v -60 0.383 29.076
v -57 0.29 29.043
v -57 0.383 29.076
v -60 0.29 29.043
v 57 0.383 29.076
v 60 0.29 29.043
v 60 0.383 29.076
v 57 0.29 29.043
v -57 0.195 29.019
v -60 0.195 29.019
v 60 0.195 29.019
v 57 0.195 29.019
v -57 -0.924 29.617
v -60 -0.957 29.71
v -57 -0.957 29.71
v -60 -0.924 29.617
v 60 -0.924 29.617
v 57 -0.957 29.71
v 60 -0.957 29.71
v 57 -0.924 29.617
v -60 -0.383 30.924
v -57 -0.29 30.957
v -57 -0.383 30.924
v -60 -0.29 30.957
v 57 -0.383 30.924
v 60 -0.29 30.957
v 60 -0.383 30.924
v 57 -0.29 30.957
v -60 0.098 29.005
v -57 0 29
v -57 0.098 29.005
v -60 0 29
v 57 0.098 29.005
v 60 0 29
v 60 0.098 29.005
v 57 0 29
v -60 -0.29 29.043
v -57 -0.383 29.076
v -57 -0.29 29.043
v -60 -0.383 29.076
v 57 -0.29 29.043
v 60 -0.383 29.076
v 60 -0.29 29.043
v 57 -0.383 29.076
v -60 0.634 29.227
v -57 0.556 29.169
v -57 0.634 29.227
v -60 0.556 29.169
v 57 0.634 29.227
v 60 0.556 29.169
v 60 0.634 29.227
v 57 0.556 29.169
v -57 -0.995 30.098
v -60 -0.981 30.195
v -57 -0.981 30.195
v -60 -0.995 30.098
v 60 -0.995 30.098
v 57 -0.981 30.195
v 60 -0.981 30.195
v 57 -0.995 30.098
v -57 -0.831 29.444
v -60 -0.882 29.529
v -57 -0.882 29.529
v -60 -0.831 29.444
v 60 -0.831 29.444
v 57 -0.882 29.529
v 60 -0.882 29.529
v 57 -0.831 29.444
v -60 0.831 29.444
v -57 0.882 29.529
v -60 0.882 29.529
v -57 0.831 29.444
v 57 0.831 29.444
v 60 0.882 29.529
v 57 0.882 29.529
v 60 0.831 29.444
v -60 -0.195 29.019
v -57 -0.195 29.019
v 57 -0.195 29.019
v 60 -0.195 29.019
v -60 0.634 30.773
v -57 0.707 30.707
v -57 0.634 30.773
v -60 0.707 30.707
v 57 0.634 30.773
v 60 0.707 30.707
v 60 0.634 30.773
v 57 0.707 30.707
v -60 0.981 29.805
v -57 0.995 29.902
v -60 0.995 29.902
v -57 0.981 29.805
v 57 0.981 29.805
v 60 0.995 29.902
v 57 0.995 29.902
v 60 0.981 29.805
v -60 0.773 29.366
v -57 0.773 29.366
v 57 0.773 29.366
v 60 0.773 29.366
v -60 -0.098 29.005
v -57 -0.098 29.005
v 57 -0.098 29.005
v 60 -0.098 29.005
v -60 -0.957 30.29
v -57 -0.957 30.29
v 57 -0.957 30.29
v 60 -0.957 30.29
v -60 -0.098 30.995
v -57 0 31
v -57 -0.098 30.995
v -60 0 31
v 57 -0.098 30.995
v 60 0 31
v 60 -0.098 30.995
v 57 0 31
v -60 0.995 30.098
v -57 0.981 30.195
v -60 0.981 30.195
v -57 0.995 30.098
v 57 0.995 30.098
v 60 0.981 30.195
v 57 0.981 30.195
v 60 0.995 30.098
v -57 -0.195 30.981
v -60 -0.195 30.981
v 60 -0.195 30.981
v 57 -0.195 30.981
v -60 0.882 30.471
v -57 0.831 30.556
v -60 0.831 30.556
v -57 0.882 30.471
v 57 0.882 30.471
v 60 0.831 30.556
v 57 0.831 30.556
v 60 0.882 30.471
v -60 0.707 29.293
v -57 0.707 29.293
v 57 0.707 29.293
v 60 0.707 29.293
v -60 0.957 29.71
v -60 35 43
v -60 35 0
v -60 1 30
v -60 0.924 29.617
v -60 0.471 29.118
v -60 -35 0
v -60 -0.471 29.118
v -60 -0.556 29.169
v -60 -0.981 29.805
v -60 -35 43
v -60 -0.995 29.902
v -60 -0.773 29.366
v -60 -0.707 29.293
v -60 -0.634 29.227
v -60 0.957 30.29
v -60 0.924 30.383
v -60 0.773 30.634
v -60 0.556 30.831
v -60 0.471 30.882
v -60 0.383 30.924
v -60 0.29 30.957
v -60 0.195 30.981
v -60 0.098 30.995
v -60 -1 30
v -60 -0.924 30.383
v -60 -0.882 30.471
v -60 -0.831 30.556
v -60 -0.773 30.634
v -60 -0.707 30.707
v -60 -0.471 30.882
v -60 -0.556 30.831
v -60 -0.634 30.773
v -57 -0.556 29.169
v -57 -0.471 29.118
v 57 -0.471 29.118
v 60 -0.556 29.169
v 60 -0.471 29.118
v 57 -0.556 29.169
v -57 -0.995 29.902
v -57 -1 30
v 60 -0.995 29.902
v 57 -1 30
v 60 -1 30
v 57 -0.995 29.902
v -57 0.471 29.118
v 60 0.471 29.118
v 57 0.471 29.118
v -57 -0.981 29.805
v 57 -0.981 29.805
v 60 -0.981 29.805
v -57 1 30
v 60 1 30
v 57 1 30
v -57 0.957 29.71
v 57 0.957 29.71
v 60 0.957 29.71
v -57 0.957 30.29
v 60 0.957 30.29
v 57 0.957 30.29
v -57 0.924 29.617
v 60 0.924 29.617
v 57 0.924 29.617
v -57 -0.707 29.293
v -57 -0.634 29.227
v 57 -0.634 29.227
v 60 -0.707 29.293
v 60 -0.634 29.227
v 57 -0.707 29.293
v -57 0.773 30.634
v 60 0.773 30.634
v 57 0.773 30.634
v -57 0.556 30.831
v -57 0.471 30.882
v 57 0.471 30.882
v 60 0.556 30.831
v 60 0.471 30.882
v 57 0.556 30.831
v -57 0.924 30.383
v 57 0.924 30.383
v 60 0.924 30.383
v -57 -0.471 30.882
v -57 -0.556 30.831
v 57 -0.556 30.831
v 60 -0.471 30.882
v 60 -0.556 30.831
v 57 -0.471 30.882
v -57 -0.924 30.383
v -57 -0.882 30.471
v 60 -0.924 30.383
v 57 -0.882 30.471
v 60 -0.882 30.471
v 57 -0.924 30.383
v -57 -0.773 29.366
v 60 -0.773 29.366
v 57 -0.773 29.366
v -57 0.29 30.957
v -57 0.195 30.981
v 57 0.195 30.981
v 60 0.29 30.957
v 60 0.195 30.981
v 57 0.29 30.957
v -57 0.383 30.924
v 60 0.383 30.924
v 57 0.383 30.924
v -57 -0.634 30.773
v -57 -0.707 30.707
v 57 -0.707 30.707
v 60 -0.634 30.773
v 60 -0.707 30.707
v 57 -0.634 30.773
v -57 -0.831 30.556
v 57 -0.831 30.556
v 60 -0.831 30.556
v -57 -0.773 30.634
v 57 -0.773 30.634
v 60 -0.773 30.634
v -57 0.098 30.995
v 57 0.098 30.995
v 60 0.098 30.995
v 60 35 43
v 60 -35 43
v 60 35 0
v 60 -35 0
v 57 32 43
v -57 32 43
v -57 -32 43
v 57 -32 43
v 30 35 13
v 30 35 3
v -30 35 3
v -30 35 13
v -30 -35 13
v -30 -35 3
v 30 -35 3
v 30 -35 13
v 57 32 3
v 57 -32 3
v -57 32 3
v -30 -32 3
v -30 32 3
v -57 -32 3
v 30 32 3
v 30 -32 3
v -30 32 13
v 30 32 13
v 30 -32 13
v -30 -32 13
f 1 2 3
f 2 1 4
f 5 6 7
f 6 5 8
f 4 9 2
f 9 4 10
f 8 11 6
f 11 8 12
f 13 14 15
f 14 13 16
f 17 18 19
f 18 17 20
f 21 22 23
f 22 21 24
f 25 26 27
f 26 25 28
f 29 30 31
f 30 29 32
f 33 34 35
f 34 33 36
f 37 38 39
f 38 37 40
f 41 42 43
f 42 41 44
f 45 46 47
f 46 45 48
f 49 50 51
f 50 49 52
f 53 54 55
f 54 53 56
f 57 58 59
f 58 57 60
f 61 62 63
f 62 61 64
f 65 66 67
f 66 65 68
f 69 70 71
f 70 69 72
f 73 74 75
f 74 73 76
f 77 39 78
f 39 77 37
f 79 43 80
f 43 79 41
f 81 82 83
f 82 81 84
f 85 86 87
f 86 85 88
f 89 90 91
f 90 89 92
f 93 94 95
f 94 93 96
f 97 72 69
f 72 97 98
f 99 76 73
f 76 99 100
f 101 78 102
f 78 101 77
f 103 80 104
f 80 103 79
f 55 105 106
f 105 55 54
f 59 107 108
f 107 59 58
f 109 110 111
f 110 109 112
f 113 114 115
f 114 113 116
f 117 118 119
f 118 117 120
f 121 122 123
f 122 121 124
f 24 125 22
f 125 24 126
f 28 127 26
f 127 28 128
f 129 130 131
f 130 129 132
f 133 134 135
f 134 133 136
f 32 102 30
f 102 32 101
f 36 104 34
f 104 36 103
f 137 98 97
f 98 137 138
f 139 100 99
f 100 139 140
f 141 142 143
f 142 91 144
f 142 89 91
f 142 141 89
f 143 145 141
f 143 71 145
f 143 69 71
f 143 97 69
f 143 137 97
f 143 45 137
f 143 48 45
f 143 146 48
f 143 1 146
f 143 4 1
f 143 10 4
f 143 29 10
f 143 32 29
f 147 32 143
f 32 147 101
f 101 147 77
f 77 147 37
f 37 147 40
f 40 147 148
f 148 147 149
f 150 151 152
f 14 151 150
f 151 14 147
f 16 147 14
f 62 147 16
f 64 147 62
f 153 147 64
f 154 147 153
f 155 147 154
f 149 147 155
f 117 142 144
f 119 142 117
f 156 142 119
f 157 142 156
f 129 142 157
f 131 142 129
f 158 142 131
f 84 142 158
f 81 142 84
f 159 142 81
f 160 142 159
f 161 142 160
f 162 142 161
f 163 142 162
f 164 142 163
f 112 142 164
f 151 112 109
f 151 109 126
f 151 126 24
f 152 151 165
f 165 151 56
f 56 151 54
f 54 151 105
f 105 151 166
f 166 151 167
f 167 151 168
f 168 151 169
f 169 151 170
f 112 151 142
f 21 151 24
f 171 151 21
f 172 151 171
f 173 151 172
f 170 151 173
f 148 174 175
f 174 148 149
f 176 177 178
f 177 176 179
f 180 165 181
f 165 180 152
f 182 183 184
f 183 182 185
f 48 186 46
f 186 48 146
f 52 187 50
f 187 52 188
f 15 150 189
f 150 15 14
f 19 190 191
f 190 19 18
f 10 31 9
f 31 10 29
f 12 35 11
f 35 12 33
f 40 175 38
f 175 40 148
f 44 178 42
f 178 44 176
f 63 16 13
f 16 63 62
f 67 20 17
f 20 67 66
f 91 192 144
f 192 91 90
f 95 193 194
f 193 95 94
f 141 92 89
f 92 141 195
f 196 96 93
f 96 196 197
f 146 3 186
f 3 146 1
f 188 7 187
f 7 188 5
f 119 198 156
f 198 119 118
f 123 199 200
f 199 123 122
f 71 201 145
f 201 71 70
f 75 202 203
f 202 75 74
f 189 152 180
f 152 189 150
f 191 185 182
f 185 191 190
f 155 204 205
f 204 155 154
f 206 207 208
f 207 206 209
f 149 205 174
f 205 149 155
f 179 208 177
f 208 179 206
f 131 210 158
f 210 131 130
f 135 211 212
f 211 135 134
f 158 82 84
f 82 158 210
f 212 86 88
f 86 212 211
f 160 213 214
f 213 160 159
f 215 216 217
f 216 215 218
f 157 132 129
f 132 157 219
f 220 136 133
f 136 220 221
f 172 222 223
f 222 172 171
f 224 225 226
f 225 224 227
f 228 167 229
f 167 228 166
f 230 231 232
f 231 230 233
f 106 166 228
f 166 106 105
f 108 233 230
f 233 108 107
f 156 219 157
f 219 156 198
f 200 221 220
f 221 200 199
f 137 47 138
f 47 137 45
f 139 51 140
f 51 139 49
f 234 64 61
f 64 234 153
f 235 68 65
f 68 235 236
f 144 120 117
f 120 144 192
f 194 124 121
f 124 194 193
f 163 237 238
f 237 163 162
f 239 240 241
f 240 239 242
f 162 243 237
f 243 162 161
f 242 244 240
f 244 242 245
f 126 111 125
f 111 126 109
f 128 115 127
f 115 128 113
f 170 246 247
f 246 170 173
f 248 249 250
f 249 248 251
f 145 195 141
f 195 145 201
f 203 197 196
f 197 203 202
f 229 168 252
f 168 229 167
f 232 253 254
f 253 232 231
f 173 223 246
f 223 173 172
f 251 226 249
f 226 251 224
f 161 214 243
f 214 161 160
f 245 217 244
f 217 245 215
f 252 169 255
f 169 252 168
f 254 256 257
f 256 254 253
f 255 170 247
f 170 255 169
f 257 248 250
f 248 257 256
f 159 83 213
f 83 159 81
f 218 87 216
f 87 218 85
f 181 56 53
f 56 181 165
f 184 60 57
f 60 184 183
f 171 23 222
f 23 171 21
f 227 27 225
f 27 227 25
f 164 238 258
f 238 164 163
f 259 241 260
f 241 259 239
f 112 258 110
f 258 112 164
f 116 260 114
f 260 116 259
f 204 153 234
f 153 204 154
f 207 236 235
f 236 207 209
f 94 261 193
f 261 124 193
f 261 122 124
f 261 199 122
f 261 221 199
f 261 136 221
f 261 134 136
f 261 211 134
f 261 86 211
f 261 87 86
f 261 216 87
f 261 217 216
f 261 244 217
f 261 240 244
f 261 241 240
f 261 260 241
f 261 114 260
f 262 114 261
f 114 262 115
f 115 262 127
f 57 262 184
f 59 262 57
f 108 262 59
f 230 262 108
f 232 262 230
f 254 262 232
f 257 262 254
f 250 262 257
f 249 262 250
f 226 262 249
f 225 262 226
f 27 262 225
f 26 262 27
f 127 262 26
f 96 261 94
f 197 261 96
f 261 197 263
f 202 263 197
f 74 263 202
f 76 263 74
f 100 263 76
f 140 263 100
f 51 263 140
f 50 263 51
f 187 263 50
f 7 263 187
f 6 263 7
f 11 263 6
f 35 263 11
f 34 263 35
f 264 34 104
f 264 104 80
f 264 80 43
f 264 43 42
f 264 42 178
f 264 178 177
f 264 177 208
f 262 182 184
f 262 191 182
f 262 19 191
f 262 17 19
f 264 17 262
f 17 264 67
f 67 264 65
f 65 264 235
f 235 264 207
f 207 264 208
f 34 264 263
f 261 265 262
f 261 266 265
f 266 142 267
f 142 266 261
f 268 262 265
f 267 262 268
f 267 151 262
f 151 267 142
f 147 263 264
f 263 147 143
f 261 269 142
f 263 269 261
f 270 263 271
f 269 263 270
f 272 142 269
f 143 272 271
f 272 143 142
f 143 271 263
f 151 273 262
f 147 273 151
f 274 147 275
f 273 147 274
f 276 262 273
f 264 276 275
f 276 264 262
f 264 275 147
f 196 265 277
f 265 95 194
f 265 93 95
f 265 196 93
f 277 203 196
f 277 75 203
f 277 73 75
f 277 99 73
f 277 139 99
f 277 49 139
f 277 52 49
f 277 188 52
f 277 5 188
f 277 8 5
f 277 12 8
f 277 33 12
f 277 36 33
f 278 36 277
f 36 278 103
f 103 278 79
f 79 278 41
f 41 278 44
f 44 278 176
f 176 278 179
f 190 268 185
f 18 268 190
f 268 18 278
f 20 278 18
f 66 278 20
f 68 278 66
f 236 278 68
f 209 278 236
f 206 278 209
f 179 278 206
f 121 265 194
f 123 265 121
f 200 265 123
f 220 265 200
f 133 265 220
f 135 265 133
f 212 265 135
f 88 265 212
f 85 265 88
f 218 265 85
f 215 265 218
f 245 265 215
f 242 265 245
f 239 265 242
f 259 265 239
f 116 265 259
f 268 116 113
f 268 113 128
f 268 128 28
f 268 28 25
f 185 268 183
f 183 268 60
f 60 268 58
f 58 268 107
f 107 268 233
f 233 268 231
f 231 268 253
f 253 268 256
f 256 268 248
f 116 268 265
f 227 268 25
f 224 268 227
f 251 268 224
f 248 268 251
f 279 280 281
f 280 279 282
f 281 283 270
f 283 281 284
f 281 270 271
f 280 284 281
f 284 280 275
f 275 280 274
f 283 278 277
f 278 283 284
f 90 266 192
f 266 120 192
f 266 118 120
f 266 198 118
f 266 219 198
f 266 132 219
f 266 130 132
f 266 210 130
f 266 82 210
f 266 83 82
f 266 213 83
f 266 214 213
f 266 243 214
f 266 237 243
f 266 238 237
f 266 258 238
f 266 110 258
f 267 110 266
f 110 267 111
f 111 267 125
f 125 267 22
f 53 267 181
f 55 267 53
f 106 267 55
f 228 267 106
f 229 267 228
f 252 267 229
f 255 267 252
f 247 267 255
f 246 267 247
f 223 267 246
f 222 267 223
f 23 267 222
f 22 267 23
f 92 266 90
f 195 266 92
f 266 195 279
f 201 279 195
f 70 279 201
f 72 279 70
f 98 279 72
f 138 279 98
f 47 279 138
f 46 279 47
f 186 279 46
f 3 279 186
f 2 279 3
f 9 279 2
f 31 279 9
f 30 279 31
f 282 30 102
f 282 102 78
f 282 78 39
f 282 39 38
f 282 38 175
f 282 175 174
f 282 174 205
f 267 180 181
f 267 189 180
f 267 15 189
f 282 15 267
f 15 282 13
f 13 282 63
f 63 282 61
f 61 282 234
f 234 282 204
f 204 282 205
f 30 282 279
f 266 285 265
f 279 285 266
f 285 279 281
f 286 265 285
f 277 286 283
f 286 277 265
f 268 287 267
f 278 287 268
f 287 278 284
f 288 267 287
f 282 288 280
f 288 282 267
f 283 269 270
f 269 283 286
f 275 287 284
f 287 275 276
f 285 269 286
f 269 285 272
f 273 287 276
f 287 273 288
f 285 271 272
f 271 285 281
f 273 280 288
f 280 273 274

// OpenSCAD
// Mini horizontal gel-electrophoresis box - buffer tank
// Print orientation: tank rests on XY plane, builds up in +Z

$fn = 64;

// ---- Tank dimensions ----
outer_x = 120;   // outer length in X
outer_y = 70;    // outer width in Y
outer_z = 40;    // outer height in Z
wall    = 3;     // wall thickness (X and Y)
floor   = 3;     // floor thickness under the inner floor

// ---- Platform dimensions ----
plat_x     = 60;   // platform length in X (centred)
plat_w     = outer_y; // platform spans full inner width
plat_top_z = 13;   // platform top height (10 mm above inner floor: 3+3+10)

// ---- Electrode holes ----
hole_d = 2;     // hole diameter
hole_y = 0;     // hole Y position
hole_z = 30;    // hole Z position

// ---- Cutting overlap ----
eps = 0.5;      // extension past cut faces

difference() {
    // Tank body (solid through the floor)
    translate([-outer_x/2, -outer_y/2, 0])
        cube([outer_x, outer_y, outer_z + floor]);

    // Inner cavity (open top)
    translate([-outer_x/2 + wall, -outer_y/2 + wall, floor])
        cube([outer_x - 2*wall, outer_y - 2*wall, outer_z]);

    // Raised platform
    translate([-plat_x/2, -plat_w/2, floor])
        cube([plat_x, plat_w, plat_top_z - floor]);

    // Electrode holes through end walls along X
    for (sx = [-1, 1])
        translate([sx > 0 ? outer_x/2 - eps : -outer_x/2, hole_y, hole_z])
            rotate([0, 90, 0])
                cylinder(d = hole_d, h = outer_x + 2*eps);
}
